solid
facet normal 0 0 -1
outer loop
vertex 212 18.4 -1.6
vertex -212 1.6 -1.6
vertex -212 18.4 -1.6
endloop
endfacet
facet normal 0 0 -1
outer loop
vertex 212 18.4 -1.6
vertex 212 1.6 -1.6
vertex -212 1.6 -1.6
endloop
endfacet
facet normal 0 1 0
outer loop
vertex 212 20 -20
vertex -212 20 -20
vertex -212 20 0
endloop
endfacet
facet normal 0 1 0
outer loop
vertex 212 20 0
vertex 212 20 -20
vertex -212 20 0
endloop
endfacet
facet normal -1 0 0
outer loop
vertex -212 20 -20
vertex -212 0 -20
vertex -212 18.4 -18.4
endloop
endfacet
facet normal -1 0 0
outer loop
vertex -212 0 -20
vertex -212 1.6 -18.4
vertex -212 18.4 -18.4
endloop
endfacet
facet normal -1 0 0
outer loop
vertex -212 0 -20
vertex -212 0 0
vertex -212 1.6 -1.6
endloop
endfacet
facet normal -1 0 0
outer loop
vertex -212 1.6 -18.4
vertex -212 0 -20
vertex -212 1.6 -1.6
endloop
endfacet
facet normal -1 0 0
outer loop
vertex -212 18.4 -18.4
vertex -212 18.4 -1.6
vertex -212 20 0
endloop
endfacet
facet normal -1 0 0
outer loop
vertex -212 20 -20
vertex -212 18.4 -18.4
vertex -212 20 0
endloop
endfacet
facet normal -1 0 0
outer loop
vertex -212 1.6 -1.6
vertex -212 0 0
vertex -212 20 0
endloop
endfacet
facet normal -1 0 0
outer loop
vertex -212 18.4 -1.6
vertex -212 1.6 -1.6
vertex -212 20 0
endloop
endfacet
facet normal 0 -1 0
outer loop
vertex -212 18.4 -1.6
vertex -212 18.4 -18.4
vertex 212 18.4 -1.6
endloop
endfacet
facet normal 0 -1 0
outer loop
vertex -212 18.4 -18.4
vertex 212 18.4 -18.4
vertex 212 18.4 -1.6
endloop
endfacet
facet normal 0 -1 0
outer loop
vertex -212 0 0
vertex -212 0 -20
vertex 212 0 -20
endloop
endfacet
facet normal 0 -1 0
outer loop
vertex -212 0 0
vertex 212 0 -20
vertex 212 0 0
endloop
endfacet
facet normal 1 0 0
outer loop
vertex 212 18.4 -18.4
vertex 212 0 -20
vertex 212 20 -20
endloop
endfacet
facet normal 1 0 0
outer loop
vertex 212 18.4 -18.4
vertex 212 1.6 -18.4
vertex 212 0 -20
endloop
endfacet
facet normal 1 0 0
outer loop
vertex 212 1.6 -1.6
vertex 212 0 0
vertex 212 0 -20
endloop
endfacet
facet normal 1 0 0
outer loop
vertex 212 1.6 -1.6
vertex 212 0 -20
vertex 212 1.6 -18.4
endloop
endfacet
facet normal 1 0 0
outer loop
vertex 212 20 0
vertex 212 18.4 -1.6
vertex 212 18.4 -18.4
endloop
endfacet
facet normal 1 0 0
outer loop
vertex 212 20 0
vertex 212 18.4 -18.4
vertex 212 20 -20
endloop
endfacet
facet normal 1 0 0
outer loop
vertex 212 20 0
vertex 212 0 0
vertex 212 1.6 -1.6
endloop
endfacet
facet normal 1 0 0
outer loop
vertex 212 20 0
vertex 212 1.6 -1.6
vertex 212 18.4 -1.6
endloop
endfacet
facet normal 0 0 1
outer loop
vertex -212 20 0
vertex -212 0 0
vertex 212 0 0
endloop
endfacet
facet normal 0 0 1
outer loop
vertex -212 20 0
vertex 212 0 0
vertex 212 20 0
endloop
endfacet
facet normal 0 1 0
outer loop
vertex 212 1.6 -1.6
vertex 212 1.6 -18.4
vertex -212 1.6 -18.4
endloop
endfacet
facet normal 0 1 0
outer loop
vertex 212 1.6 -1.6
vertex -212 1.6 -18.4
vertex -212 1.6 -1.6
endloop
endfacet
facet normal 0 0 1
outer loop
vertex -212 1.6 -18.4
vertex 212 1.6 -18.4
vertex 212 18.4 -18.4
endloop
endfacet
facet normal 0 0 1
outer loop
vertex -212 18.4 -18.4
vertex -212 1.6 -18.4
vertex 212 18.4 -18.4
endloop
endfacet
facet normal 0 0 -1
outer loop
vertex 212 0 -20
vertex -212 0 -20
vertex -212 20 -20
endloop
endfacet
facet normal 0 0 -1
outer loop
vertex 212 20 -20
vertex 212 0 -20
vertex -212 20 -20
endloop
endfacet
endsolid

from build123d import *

# Parameters (mm, degrees)
F0_W     = 20
F0_H     = 20
F0_W_2   = 16.8
F0_H_2   = 16.8
F1_DEPTH = 212


with BuildPart() as f1:
    # F0 (on Right) → F1 (new body, symmetric)
    with BuildSketch(Plane.YZ):
        with Locations((10, -10)):
            Rectangle(F0_W, F0_H)
        with Locations((10, -10)):
            Rectangle(F0_W_2, F0_H_2, mode=Mode.SUBTRACT)
    extrude(amount=F1_DEPTH, both=True)


solid = f1.part
